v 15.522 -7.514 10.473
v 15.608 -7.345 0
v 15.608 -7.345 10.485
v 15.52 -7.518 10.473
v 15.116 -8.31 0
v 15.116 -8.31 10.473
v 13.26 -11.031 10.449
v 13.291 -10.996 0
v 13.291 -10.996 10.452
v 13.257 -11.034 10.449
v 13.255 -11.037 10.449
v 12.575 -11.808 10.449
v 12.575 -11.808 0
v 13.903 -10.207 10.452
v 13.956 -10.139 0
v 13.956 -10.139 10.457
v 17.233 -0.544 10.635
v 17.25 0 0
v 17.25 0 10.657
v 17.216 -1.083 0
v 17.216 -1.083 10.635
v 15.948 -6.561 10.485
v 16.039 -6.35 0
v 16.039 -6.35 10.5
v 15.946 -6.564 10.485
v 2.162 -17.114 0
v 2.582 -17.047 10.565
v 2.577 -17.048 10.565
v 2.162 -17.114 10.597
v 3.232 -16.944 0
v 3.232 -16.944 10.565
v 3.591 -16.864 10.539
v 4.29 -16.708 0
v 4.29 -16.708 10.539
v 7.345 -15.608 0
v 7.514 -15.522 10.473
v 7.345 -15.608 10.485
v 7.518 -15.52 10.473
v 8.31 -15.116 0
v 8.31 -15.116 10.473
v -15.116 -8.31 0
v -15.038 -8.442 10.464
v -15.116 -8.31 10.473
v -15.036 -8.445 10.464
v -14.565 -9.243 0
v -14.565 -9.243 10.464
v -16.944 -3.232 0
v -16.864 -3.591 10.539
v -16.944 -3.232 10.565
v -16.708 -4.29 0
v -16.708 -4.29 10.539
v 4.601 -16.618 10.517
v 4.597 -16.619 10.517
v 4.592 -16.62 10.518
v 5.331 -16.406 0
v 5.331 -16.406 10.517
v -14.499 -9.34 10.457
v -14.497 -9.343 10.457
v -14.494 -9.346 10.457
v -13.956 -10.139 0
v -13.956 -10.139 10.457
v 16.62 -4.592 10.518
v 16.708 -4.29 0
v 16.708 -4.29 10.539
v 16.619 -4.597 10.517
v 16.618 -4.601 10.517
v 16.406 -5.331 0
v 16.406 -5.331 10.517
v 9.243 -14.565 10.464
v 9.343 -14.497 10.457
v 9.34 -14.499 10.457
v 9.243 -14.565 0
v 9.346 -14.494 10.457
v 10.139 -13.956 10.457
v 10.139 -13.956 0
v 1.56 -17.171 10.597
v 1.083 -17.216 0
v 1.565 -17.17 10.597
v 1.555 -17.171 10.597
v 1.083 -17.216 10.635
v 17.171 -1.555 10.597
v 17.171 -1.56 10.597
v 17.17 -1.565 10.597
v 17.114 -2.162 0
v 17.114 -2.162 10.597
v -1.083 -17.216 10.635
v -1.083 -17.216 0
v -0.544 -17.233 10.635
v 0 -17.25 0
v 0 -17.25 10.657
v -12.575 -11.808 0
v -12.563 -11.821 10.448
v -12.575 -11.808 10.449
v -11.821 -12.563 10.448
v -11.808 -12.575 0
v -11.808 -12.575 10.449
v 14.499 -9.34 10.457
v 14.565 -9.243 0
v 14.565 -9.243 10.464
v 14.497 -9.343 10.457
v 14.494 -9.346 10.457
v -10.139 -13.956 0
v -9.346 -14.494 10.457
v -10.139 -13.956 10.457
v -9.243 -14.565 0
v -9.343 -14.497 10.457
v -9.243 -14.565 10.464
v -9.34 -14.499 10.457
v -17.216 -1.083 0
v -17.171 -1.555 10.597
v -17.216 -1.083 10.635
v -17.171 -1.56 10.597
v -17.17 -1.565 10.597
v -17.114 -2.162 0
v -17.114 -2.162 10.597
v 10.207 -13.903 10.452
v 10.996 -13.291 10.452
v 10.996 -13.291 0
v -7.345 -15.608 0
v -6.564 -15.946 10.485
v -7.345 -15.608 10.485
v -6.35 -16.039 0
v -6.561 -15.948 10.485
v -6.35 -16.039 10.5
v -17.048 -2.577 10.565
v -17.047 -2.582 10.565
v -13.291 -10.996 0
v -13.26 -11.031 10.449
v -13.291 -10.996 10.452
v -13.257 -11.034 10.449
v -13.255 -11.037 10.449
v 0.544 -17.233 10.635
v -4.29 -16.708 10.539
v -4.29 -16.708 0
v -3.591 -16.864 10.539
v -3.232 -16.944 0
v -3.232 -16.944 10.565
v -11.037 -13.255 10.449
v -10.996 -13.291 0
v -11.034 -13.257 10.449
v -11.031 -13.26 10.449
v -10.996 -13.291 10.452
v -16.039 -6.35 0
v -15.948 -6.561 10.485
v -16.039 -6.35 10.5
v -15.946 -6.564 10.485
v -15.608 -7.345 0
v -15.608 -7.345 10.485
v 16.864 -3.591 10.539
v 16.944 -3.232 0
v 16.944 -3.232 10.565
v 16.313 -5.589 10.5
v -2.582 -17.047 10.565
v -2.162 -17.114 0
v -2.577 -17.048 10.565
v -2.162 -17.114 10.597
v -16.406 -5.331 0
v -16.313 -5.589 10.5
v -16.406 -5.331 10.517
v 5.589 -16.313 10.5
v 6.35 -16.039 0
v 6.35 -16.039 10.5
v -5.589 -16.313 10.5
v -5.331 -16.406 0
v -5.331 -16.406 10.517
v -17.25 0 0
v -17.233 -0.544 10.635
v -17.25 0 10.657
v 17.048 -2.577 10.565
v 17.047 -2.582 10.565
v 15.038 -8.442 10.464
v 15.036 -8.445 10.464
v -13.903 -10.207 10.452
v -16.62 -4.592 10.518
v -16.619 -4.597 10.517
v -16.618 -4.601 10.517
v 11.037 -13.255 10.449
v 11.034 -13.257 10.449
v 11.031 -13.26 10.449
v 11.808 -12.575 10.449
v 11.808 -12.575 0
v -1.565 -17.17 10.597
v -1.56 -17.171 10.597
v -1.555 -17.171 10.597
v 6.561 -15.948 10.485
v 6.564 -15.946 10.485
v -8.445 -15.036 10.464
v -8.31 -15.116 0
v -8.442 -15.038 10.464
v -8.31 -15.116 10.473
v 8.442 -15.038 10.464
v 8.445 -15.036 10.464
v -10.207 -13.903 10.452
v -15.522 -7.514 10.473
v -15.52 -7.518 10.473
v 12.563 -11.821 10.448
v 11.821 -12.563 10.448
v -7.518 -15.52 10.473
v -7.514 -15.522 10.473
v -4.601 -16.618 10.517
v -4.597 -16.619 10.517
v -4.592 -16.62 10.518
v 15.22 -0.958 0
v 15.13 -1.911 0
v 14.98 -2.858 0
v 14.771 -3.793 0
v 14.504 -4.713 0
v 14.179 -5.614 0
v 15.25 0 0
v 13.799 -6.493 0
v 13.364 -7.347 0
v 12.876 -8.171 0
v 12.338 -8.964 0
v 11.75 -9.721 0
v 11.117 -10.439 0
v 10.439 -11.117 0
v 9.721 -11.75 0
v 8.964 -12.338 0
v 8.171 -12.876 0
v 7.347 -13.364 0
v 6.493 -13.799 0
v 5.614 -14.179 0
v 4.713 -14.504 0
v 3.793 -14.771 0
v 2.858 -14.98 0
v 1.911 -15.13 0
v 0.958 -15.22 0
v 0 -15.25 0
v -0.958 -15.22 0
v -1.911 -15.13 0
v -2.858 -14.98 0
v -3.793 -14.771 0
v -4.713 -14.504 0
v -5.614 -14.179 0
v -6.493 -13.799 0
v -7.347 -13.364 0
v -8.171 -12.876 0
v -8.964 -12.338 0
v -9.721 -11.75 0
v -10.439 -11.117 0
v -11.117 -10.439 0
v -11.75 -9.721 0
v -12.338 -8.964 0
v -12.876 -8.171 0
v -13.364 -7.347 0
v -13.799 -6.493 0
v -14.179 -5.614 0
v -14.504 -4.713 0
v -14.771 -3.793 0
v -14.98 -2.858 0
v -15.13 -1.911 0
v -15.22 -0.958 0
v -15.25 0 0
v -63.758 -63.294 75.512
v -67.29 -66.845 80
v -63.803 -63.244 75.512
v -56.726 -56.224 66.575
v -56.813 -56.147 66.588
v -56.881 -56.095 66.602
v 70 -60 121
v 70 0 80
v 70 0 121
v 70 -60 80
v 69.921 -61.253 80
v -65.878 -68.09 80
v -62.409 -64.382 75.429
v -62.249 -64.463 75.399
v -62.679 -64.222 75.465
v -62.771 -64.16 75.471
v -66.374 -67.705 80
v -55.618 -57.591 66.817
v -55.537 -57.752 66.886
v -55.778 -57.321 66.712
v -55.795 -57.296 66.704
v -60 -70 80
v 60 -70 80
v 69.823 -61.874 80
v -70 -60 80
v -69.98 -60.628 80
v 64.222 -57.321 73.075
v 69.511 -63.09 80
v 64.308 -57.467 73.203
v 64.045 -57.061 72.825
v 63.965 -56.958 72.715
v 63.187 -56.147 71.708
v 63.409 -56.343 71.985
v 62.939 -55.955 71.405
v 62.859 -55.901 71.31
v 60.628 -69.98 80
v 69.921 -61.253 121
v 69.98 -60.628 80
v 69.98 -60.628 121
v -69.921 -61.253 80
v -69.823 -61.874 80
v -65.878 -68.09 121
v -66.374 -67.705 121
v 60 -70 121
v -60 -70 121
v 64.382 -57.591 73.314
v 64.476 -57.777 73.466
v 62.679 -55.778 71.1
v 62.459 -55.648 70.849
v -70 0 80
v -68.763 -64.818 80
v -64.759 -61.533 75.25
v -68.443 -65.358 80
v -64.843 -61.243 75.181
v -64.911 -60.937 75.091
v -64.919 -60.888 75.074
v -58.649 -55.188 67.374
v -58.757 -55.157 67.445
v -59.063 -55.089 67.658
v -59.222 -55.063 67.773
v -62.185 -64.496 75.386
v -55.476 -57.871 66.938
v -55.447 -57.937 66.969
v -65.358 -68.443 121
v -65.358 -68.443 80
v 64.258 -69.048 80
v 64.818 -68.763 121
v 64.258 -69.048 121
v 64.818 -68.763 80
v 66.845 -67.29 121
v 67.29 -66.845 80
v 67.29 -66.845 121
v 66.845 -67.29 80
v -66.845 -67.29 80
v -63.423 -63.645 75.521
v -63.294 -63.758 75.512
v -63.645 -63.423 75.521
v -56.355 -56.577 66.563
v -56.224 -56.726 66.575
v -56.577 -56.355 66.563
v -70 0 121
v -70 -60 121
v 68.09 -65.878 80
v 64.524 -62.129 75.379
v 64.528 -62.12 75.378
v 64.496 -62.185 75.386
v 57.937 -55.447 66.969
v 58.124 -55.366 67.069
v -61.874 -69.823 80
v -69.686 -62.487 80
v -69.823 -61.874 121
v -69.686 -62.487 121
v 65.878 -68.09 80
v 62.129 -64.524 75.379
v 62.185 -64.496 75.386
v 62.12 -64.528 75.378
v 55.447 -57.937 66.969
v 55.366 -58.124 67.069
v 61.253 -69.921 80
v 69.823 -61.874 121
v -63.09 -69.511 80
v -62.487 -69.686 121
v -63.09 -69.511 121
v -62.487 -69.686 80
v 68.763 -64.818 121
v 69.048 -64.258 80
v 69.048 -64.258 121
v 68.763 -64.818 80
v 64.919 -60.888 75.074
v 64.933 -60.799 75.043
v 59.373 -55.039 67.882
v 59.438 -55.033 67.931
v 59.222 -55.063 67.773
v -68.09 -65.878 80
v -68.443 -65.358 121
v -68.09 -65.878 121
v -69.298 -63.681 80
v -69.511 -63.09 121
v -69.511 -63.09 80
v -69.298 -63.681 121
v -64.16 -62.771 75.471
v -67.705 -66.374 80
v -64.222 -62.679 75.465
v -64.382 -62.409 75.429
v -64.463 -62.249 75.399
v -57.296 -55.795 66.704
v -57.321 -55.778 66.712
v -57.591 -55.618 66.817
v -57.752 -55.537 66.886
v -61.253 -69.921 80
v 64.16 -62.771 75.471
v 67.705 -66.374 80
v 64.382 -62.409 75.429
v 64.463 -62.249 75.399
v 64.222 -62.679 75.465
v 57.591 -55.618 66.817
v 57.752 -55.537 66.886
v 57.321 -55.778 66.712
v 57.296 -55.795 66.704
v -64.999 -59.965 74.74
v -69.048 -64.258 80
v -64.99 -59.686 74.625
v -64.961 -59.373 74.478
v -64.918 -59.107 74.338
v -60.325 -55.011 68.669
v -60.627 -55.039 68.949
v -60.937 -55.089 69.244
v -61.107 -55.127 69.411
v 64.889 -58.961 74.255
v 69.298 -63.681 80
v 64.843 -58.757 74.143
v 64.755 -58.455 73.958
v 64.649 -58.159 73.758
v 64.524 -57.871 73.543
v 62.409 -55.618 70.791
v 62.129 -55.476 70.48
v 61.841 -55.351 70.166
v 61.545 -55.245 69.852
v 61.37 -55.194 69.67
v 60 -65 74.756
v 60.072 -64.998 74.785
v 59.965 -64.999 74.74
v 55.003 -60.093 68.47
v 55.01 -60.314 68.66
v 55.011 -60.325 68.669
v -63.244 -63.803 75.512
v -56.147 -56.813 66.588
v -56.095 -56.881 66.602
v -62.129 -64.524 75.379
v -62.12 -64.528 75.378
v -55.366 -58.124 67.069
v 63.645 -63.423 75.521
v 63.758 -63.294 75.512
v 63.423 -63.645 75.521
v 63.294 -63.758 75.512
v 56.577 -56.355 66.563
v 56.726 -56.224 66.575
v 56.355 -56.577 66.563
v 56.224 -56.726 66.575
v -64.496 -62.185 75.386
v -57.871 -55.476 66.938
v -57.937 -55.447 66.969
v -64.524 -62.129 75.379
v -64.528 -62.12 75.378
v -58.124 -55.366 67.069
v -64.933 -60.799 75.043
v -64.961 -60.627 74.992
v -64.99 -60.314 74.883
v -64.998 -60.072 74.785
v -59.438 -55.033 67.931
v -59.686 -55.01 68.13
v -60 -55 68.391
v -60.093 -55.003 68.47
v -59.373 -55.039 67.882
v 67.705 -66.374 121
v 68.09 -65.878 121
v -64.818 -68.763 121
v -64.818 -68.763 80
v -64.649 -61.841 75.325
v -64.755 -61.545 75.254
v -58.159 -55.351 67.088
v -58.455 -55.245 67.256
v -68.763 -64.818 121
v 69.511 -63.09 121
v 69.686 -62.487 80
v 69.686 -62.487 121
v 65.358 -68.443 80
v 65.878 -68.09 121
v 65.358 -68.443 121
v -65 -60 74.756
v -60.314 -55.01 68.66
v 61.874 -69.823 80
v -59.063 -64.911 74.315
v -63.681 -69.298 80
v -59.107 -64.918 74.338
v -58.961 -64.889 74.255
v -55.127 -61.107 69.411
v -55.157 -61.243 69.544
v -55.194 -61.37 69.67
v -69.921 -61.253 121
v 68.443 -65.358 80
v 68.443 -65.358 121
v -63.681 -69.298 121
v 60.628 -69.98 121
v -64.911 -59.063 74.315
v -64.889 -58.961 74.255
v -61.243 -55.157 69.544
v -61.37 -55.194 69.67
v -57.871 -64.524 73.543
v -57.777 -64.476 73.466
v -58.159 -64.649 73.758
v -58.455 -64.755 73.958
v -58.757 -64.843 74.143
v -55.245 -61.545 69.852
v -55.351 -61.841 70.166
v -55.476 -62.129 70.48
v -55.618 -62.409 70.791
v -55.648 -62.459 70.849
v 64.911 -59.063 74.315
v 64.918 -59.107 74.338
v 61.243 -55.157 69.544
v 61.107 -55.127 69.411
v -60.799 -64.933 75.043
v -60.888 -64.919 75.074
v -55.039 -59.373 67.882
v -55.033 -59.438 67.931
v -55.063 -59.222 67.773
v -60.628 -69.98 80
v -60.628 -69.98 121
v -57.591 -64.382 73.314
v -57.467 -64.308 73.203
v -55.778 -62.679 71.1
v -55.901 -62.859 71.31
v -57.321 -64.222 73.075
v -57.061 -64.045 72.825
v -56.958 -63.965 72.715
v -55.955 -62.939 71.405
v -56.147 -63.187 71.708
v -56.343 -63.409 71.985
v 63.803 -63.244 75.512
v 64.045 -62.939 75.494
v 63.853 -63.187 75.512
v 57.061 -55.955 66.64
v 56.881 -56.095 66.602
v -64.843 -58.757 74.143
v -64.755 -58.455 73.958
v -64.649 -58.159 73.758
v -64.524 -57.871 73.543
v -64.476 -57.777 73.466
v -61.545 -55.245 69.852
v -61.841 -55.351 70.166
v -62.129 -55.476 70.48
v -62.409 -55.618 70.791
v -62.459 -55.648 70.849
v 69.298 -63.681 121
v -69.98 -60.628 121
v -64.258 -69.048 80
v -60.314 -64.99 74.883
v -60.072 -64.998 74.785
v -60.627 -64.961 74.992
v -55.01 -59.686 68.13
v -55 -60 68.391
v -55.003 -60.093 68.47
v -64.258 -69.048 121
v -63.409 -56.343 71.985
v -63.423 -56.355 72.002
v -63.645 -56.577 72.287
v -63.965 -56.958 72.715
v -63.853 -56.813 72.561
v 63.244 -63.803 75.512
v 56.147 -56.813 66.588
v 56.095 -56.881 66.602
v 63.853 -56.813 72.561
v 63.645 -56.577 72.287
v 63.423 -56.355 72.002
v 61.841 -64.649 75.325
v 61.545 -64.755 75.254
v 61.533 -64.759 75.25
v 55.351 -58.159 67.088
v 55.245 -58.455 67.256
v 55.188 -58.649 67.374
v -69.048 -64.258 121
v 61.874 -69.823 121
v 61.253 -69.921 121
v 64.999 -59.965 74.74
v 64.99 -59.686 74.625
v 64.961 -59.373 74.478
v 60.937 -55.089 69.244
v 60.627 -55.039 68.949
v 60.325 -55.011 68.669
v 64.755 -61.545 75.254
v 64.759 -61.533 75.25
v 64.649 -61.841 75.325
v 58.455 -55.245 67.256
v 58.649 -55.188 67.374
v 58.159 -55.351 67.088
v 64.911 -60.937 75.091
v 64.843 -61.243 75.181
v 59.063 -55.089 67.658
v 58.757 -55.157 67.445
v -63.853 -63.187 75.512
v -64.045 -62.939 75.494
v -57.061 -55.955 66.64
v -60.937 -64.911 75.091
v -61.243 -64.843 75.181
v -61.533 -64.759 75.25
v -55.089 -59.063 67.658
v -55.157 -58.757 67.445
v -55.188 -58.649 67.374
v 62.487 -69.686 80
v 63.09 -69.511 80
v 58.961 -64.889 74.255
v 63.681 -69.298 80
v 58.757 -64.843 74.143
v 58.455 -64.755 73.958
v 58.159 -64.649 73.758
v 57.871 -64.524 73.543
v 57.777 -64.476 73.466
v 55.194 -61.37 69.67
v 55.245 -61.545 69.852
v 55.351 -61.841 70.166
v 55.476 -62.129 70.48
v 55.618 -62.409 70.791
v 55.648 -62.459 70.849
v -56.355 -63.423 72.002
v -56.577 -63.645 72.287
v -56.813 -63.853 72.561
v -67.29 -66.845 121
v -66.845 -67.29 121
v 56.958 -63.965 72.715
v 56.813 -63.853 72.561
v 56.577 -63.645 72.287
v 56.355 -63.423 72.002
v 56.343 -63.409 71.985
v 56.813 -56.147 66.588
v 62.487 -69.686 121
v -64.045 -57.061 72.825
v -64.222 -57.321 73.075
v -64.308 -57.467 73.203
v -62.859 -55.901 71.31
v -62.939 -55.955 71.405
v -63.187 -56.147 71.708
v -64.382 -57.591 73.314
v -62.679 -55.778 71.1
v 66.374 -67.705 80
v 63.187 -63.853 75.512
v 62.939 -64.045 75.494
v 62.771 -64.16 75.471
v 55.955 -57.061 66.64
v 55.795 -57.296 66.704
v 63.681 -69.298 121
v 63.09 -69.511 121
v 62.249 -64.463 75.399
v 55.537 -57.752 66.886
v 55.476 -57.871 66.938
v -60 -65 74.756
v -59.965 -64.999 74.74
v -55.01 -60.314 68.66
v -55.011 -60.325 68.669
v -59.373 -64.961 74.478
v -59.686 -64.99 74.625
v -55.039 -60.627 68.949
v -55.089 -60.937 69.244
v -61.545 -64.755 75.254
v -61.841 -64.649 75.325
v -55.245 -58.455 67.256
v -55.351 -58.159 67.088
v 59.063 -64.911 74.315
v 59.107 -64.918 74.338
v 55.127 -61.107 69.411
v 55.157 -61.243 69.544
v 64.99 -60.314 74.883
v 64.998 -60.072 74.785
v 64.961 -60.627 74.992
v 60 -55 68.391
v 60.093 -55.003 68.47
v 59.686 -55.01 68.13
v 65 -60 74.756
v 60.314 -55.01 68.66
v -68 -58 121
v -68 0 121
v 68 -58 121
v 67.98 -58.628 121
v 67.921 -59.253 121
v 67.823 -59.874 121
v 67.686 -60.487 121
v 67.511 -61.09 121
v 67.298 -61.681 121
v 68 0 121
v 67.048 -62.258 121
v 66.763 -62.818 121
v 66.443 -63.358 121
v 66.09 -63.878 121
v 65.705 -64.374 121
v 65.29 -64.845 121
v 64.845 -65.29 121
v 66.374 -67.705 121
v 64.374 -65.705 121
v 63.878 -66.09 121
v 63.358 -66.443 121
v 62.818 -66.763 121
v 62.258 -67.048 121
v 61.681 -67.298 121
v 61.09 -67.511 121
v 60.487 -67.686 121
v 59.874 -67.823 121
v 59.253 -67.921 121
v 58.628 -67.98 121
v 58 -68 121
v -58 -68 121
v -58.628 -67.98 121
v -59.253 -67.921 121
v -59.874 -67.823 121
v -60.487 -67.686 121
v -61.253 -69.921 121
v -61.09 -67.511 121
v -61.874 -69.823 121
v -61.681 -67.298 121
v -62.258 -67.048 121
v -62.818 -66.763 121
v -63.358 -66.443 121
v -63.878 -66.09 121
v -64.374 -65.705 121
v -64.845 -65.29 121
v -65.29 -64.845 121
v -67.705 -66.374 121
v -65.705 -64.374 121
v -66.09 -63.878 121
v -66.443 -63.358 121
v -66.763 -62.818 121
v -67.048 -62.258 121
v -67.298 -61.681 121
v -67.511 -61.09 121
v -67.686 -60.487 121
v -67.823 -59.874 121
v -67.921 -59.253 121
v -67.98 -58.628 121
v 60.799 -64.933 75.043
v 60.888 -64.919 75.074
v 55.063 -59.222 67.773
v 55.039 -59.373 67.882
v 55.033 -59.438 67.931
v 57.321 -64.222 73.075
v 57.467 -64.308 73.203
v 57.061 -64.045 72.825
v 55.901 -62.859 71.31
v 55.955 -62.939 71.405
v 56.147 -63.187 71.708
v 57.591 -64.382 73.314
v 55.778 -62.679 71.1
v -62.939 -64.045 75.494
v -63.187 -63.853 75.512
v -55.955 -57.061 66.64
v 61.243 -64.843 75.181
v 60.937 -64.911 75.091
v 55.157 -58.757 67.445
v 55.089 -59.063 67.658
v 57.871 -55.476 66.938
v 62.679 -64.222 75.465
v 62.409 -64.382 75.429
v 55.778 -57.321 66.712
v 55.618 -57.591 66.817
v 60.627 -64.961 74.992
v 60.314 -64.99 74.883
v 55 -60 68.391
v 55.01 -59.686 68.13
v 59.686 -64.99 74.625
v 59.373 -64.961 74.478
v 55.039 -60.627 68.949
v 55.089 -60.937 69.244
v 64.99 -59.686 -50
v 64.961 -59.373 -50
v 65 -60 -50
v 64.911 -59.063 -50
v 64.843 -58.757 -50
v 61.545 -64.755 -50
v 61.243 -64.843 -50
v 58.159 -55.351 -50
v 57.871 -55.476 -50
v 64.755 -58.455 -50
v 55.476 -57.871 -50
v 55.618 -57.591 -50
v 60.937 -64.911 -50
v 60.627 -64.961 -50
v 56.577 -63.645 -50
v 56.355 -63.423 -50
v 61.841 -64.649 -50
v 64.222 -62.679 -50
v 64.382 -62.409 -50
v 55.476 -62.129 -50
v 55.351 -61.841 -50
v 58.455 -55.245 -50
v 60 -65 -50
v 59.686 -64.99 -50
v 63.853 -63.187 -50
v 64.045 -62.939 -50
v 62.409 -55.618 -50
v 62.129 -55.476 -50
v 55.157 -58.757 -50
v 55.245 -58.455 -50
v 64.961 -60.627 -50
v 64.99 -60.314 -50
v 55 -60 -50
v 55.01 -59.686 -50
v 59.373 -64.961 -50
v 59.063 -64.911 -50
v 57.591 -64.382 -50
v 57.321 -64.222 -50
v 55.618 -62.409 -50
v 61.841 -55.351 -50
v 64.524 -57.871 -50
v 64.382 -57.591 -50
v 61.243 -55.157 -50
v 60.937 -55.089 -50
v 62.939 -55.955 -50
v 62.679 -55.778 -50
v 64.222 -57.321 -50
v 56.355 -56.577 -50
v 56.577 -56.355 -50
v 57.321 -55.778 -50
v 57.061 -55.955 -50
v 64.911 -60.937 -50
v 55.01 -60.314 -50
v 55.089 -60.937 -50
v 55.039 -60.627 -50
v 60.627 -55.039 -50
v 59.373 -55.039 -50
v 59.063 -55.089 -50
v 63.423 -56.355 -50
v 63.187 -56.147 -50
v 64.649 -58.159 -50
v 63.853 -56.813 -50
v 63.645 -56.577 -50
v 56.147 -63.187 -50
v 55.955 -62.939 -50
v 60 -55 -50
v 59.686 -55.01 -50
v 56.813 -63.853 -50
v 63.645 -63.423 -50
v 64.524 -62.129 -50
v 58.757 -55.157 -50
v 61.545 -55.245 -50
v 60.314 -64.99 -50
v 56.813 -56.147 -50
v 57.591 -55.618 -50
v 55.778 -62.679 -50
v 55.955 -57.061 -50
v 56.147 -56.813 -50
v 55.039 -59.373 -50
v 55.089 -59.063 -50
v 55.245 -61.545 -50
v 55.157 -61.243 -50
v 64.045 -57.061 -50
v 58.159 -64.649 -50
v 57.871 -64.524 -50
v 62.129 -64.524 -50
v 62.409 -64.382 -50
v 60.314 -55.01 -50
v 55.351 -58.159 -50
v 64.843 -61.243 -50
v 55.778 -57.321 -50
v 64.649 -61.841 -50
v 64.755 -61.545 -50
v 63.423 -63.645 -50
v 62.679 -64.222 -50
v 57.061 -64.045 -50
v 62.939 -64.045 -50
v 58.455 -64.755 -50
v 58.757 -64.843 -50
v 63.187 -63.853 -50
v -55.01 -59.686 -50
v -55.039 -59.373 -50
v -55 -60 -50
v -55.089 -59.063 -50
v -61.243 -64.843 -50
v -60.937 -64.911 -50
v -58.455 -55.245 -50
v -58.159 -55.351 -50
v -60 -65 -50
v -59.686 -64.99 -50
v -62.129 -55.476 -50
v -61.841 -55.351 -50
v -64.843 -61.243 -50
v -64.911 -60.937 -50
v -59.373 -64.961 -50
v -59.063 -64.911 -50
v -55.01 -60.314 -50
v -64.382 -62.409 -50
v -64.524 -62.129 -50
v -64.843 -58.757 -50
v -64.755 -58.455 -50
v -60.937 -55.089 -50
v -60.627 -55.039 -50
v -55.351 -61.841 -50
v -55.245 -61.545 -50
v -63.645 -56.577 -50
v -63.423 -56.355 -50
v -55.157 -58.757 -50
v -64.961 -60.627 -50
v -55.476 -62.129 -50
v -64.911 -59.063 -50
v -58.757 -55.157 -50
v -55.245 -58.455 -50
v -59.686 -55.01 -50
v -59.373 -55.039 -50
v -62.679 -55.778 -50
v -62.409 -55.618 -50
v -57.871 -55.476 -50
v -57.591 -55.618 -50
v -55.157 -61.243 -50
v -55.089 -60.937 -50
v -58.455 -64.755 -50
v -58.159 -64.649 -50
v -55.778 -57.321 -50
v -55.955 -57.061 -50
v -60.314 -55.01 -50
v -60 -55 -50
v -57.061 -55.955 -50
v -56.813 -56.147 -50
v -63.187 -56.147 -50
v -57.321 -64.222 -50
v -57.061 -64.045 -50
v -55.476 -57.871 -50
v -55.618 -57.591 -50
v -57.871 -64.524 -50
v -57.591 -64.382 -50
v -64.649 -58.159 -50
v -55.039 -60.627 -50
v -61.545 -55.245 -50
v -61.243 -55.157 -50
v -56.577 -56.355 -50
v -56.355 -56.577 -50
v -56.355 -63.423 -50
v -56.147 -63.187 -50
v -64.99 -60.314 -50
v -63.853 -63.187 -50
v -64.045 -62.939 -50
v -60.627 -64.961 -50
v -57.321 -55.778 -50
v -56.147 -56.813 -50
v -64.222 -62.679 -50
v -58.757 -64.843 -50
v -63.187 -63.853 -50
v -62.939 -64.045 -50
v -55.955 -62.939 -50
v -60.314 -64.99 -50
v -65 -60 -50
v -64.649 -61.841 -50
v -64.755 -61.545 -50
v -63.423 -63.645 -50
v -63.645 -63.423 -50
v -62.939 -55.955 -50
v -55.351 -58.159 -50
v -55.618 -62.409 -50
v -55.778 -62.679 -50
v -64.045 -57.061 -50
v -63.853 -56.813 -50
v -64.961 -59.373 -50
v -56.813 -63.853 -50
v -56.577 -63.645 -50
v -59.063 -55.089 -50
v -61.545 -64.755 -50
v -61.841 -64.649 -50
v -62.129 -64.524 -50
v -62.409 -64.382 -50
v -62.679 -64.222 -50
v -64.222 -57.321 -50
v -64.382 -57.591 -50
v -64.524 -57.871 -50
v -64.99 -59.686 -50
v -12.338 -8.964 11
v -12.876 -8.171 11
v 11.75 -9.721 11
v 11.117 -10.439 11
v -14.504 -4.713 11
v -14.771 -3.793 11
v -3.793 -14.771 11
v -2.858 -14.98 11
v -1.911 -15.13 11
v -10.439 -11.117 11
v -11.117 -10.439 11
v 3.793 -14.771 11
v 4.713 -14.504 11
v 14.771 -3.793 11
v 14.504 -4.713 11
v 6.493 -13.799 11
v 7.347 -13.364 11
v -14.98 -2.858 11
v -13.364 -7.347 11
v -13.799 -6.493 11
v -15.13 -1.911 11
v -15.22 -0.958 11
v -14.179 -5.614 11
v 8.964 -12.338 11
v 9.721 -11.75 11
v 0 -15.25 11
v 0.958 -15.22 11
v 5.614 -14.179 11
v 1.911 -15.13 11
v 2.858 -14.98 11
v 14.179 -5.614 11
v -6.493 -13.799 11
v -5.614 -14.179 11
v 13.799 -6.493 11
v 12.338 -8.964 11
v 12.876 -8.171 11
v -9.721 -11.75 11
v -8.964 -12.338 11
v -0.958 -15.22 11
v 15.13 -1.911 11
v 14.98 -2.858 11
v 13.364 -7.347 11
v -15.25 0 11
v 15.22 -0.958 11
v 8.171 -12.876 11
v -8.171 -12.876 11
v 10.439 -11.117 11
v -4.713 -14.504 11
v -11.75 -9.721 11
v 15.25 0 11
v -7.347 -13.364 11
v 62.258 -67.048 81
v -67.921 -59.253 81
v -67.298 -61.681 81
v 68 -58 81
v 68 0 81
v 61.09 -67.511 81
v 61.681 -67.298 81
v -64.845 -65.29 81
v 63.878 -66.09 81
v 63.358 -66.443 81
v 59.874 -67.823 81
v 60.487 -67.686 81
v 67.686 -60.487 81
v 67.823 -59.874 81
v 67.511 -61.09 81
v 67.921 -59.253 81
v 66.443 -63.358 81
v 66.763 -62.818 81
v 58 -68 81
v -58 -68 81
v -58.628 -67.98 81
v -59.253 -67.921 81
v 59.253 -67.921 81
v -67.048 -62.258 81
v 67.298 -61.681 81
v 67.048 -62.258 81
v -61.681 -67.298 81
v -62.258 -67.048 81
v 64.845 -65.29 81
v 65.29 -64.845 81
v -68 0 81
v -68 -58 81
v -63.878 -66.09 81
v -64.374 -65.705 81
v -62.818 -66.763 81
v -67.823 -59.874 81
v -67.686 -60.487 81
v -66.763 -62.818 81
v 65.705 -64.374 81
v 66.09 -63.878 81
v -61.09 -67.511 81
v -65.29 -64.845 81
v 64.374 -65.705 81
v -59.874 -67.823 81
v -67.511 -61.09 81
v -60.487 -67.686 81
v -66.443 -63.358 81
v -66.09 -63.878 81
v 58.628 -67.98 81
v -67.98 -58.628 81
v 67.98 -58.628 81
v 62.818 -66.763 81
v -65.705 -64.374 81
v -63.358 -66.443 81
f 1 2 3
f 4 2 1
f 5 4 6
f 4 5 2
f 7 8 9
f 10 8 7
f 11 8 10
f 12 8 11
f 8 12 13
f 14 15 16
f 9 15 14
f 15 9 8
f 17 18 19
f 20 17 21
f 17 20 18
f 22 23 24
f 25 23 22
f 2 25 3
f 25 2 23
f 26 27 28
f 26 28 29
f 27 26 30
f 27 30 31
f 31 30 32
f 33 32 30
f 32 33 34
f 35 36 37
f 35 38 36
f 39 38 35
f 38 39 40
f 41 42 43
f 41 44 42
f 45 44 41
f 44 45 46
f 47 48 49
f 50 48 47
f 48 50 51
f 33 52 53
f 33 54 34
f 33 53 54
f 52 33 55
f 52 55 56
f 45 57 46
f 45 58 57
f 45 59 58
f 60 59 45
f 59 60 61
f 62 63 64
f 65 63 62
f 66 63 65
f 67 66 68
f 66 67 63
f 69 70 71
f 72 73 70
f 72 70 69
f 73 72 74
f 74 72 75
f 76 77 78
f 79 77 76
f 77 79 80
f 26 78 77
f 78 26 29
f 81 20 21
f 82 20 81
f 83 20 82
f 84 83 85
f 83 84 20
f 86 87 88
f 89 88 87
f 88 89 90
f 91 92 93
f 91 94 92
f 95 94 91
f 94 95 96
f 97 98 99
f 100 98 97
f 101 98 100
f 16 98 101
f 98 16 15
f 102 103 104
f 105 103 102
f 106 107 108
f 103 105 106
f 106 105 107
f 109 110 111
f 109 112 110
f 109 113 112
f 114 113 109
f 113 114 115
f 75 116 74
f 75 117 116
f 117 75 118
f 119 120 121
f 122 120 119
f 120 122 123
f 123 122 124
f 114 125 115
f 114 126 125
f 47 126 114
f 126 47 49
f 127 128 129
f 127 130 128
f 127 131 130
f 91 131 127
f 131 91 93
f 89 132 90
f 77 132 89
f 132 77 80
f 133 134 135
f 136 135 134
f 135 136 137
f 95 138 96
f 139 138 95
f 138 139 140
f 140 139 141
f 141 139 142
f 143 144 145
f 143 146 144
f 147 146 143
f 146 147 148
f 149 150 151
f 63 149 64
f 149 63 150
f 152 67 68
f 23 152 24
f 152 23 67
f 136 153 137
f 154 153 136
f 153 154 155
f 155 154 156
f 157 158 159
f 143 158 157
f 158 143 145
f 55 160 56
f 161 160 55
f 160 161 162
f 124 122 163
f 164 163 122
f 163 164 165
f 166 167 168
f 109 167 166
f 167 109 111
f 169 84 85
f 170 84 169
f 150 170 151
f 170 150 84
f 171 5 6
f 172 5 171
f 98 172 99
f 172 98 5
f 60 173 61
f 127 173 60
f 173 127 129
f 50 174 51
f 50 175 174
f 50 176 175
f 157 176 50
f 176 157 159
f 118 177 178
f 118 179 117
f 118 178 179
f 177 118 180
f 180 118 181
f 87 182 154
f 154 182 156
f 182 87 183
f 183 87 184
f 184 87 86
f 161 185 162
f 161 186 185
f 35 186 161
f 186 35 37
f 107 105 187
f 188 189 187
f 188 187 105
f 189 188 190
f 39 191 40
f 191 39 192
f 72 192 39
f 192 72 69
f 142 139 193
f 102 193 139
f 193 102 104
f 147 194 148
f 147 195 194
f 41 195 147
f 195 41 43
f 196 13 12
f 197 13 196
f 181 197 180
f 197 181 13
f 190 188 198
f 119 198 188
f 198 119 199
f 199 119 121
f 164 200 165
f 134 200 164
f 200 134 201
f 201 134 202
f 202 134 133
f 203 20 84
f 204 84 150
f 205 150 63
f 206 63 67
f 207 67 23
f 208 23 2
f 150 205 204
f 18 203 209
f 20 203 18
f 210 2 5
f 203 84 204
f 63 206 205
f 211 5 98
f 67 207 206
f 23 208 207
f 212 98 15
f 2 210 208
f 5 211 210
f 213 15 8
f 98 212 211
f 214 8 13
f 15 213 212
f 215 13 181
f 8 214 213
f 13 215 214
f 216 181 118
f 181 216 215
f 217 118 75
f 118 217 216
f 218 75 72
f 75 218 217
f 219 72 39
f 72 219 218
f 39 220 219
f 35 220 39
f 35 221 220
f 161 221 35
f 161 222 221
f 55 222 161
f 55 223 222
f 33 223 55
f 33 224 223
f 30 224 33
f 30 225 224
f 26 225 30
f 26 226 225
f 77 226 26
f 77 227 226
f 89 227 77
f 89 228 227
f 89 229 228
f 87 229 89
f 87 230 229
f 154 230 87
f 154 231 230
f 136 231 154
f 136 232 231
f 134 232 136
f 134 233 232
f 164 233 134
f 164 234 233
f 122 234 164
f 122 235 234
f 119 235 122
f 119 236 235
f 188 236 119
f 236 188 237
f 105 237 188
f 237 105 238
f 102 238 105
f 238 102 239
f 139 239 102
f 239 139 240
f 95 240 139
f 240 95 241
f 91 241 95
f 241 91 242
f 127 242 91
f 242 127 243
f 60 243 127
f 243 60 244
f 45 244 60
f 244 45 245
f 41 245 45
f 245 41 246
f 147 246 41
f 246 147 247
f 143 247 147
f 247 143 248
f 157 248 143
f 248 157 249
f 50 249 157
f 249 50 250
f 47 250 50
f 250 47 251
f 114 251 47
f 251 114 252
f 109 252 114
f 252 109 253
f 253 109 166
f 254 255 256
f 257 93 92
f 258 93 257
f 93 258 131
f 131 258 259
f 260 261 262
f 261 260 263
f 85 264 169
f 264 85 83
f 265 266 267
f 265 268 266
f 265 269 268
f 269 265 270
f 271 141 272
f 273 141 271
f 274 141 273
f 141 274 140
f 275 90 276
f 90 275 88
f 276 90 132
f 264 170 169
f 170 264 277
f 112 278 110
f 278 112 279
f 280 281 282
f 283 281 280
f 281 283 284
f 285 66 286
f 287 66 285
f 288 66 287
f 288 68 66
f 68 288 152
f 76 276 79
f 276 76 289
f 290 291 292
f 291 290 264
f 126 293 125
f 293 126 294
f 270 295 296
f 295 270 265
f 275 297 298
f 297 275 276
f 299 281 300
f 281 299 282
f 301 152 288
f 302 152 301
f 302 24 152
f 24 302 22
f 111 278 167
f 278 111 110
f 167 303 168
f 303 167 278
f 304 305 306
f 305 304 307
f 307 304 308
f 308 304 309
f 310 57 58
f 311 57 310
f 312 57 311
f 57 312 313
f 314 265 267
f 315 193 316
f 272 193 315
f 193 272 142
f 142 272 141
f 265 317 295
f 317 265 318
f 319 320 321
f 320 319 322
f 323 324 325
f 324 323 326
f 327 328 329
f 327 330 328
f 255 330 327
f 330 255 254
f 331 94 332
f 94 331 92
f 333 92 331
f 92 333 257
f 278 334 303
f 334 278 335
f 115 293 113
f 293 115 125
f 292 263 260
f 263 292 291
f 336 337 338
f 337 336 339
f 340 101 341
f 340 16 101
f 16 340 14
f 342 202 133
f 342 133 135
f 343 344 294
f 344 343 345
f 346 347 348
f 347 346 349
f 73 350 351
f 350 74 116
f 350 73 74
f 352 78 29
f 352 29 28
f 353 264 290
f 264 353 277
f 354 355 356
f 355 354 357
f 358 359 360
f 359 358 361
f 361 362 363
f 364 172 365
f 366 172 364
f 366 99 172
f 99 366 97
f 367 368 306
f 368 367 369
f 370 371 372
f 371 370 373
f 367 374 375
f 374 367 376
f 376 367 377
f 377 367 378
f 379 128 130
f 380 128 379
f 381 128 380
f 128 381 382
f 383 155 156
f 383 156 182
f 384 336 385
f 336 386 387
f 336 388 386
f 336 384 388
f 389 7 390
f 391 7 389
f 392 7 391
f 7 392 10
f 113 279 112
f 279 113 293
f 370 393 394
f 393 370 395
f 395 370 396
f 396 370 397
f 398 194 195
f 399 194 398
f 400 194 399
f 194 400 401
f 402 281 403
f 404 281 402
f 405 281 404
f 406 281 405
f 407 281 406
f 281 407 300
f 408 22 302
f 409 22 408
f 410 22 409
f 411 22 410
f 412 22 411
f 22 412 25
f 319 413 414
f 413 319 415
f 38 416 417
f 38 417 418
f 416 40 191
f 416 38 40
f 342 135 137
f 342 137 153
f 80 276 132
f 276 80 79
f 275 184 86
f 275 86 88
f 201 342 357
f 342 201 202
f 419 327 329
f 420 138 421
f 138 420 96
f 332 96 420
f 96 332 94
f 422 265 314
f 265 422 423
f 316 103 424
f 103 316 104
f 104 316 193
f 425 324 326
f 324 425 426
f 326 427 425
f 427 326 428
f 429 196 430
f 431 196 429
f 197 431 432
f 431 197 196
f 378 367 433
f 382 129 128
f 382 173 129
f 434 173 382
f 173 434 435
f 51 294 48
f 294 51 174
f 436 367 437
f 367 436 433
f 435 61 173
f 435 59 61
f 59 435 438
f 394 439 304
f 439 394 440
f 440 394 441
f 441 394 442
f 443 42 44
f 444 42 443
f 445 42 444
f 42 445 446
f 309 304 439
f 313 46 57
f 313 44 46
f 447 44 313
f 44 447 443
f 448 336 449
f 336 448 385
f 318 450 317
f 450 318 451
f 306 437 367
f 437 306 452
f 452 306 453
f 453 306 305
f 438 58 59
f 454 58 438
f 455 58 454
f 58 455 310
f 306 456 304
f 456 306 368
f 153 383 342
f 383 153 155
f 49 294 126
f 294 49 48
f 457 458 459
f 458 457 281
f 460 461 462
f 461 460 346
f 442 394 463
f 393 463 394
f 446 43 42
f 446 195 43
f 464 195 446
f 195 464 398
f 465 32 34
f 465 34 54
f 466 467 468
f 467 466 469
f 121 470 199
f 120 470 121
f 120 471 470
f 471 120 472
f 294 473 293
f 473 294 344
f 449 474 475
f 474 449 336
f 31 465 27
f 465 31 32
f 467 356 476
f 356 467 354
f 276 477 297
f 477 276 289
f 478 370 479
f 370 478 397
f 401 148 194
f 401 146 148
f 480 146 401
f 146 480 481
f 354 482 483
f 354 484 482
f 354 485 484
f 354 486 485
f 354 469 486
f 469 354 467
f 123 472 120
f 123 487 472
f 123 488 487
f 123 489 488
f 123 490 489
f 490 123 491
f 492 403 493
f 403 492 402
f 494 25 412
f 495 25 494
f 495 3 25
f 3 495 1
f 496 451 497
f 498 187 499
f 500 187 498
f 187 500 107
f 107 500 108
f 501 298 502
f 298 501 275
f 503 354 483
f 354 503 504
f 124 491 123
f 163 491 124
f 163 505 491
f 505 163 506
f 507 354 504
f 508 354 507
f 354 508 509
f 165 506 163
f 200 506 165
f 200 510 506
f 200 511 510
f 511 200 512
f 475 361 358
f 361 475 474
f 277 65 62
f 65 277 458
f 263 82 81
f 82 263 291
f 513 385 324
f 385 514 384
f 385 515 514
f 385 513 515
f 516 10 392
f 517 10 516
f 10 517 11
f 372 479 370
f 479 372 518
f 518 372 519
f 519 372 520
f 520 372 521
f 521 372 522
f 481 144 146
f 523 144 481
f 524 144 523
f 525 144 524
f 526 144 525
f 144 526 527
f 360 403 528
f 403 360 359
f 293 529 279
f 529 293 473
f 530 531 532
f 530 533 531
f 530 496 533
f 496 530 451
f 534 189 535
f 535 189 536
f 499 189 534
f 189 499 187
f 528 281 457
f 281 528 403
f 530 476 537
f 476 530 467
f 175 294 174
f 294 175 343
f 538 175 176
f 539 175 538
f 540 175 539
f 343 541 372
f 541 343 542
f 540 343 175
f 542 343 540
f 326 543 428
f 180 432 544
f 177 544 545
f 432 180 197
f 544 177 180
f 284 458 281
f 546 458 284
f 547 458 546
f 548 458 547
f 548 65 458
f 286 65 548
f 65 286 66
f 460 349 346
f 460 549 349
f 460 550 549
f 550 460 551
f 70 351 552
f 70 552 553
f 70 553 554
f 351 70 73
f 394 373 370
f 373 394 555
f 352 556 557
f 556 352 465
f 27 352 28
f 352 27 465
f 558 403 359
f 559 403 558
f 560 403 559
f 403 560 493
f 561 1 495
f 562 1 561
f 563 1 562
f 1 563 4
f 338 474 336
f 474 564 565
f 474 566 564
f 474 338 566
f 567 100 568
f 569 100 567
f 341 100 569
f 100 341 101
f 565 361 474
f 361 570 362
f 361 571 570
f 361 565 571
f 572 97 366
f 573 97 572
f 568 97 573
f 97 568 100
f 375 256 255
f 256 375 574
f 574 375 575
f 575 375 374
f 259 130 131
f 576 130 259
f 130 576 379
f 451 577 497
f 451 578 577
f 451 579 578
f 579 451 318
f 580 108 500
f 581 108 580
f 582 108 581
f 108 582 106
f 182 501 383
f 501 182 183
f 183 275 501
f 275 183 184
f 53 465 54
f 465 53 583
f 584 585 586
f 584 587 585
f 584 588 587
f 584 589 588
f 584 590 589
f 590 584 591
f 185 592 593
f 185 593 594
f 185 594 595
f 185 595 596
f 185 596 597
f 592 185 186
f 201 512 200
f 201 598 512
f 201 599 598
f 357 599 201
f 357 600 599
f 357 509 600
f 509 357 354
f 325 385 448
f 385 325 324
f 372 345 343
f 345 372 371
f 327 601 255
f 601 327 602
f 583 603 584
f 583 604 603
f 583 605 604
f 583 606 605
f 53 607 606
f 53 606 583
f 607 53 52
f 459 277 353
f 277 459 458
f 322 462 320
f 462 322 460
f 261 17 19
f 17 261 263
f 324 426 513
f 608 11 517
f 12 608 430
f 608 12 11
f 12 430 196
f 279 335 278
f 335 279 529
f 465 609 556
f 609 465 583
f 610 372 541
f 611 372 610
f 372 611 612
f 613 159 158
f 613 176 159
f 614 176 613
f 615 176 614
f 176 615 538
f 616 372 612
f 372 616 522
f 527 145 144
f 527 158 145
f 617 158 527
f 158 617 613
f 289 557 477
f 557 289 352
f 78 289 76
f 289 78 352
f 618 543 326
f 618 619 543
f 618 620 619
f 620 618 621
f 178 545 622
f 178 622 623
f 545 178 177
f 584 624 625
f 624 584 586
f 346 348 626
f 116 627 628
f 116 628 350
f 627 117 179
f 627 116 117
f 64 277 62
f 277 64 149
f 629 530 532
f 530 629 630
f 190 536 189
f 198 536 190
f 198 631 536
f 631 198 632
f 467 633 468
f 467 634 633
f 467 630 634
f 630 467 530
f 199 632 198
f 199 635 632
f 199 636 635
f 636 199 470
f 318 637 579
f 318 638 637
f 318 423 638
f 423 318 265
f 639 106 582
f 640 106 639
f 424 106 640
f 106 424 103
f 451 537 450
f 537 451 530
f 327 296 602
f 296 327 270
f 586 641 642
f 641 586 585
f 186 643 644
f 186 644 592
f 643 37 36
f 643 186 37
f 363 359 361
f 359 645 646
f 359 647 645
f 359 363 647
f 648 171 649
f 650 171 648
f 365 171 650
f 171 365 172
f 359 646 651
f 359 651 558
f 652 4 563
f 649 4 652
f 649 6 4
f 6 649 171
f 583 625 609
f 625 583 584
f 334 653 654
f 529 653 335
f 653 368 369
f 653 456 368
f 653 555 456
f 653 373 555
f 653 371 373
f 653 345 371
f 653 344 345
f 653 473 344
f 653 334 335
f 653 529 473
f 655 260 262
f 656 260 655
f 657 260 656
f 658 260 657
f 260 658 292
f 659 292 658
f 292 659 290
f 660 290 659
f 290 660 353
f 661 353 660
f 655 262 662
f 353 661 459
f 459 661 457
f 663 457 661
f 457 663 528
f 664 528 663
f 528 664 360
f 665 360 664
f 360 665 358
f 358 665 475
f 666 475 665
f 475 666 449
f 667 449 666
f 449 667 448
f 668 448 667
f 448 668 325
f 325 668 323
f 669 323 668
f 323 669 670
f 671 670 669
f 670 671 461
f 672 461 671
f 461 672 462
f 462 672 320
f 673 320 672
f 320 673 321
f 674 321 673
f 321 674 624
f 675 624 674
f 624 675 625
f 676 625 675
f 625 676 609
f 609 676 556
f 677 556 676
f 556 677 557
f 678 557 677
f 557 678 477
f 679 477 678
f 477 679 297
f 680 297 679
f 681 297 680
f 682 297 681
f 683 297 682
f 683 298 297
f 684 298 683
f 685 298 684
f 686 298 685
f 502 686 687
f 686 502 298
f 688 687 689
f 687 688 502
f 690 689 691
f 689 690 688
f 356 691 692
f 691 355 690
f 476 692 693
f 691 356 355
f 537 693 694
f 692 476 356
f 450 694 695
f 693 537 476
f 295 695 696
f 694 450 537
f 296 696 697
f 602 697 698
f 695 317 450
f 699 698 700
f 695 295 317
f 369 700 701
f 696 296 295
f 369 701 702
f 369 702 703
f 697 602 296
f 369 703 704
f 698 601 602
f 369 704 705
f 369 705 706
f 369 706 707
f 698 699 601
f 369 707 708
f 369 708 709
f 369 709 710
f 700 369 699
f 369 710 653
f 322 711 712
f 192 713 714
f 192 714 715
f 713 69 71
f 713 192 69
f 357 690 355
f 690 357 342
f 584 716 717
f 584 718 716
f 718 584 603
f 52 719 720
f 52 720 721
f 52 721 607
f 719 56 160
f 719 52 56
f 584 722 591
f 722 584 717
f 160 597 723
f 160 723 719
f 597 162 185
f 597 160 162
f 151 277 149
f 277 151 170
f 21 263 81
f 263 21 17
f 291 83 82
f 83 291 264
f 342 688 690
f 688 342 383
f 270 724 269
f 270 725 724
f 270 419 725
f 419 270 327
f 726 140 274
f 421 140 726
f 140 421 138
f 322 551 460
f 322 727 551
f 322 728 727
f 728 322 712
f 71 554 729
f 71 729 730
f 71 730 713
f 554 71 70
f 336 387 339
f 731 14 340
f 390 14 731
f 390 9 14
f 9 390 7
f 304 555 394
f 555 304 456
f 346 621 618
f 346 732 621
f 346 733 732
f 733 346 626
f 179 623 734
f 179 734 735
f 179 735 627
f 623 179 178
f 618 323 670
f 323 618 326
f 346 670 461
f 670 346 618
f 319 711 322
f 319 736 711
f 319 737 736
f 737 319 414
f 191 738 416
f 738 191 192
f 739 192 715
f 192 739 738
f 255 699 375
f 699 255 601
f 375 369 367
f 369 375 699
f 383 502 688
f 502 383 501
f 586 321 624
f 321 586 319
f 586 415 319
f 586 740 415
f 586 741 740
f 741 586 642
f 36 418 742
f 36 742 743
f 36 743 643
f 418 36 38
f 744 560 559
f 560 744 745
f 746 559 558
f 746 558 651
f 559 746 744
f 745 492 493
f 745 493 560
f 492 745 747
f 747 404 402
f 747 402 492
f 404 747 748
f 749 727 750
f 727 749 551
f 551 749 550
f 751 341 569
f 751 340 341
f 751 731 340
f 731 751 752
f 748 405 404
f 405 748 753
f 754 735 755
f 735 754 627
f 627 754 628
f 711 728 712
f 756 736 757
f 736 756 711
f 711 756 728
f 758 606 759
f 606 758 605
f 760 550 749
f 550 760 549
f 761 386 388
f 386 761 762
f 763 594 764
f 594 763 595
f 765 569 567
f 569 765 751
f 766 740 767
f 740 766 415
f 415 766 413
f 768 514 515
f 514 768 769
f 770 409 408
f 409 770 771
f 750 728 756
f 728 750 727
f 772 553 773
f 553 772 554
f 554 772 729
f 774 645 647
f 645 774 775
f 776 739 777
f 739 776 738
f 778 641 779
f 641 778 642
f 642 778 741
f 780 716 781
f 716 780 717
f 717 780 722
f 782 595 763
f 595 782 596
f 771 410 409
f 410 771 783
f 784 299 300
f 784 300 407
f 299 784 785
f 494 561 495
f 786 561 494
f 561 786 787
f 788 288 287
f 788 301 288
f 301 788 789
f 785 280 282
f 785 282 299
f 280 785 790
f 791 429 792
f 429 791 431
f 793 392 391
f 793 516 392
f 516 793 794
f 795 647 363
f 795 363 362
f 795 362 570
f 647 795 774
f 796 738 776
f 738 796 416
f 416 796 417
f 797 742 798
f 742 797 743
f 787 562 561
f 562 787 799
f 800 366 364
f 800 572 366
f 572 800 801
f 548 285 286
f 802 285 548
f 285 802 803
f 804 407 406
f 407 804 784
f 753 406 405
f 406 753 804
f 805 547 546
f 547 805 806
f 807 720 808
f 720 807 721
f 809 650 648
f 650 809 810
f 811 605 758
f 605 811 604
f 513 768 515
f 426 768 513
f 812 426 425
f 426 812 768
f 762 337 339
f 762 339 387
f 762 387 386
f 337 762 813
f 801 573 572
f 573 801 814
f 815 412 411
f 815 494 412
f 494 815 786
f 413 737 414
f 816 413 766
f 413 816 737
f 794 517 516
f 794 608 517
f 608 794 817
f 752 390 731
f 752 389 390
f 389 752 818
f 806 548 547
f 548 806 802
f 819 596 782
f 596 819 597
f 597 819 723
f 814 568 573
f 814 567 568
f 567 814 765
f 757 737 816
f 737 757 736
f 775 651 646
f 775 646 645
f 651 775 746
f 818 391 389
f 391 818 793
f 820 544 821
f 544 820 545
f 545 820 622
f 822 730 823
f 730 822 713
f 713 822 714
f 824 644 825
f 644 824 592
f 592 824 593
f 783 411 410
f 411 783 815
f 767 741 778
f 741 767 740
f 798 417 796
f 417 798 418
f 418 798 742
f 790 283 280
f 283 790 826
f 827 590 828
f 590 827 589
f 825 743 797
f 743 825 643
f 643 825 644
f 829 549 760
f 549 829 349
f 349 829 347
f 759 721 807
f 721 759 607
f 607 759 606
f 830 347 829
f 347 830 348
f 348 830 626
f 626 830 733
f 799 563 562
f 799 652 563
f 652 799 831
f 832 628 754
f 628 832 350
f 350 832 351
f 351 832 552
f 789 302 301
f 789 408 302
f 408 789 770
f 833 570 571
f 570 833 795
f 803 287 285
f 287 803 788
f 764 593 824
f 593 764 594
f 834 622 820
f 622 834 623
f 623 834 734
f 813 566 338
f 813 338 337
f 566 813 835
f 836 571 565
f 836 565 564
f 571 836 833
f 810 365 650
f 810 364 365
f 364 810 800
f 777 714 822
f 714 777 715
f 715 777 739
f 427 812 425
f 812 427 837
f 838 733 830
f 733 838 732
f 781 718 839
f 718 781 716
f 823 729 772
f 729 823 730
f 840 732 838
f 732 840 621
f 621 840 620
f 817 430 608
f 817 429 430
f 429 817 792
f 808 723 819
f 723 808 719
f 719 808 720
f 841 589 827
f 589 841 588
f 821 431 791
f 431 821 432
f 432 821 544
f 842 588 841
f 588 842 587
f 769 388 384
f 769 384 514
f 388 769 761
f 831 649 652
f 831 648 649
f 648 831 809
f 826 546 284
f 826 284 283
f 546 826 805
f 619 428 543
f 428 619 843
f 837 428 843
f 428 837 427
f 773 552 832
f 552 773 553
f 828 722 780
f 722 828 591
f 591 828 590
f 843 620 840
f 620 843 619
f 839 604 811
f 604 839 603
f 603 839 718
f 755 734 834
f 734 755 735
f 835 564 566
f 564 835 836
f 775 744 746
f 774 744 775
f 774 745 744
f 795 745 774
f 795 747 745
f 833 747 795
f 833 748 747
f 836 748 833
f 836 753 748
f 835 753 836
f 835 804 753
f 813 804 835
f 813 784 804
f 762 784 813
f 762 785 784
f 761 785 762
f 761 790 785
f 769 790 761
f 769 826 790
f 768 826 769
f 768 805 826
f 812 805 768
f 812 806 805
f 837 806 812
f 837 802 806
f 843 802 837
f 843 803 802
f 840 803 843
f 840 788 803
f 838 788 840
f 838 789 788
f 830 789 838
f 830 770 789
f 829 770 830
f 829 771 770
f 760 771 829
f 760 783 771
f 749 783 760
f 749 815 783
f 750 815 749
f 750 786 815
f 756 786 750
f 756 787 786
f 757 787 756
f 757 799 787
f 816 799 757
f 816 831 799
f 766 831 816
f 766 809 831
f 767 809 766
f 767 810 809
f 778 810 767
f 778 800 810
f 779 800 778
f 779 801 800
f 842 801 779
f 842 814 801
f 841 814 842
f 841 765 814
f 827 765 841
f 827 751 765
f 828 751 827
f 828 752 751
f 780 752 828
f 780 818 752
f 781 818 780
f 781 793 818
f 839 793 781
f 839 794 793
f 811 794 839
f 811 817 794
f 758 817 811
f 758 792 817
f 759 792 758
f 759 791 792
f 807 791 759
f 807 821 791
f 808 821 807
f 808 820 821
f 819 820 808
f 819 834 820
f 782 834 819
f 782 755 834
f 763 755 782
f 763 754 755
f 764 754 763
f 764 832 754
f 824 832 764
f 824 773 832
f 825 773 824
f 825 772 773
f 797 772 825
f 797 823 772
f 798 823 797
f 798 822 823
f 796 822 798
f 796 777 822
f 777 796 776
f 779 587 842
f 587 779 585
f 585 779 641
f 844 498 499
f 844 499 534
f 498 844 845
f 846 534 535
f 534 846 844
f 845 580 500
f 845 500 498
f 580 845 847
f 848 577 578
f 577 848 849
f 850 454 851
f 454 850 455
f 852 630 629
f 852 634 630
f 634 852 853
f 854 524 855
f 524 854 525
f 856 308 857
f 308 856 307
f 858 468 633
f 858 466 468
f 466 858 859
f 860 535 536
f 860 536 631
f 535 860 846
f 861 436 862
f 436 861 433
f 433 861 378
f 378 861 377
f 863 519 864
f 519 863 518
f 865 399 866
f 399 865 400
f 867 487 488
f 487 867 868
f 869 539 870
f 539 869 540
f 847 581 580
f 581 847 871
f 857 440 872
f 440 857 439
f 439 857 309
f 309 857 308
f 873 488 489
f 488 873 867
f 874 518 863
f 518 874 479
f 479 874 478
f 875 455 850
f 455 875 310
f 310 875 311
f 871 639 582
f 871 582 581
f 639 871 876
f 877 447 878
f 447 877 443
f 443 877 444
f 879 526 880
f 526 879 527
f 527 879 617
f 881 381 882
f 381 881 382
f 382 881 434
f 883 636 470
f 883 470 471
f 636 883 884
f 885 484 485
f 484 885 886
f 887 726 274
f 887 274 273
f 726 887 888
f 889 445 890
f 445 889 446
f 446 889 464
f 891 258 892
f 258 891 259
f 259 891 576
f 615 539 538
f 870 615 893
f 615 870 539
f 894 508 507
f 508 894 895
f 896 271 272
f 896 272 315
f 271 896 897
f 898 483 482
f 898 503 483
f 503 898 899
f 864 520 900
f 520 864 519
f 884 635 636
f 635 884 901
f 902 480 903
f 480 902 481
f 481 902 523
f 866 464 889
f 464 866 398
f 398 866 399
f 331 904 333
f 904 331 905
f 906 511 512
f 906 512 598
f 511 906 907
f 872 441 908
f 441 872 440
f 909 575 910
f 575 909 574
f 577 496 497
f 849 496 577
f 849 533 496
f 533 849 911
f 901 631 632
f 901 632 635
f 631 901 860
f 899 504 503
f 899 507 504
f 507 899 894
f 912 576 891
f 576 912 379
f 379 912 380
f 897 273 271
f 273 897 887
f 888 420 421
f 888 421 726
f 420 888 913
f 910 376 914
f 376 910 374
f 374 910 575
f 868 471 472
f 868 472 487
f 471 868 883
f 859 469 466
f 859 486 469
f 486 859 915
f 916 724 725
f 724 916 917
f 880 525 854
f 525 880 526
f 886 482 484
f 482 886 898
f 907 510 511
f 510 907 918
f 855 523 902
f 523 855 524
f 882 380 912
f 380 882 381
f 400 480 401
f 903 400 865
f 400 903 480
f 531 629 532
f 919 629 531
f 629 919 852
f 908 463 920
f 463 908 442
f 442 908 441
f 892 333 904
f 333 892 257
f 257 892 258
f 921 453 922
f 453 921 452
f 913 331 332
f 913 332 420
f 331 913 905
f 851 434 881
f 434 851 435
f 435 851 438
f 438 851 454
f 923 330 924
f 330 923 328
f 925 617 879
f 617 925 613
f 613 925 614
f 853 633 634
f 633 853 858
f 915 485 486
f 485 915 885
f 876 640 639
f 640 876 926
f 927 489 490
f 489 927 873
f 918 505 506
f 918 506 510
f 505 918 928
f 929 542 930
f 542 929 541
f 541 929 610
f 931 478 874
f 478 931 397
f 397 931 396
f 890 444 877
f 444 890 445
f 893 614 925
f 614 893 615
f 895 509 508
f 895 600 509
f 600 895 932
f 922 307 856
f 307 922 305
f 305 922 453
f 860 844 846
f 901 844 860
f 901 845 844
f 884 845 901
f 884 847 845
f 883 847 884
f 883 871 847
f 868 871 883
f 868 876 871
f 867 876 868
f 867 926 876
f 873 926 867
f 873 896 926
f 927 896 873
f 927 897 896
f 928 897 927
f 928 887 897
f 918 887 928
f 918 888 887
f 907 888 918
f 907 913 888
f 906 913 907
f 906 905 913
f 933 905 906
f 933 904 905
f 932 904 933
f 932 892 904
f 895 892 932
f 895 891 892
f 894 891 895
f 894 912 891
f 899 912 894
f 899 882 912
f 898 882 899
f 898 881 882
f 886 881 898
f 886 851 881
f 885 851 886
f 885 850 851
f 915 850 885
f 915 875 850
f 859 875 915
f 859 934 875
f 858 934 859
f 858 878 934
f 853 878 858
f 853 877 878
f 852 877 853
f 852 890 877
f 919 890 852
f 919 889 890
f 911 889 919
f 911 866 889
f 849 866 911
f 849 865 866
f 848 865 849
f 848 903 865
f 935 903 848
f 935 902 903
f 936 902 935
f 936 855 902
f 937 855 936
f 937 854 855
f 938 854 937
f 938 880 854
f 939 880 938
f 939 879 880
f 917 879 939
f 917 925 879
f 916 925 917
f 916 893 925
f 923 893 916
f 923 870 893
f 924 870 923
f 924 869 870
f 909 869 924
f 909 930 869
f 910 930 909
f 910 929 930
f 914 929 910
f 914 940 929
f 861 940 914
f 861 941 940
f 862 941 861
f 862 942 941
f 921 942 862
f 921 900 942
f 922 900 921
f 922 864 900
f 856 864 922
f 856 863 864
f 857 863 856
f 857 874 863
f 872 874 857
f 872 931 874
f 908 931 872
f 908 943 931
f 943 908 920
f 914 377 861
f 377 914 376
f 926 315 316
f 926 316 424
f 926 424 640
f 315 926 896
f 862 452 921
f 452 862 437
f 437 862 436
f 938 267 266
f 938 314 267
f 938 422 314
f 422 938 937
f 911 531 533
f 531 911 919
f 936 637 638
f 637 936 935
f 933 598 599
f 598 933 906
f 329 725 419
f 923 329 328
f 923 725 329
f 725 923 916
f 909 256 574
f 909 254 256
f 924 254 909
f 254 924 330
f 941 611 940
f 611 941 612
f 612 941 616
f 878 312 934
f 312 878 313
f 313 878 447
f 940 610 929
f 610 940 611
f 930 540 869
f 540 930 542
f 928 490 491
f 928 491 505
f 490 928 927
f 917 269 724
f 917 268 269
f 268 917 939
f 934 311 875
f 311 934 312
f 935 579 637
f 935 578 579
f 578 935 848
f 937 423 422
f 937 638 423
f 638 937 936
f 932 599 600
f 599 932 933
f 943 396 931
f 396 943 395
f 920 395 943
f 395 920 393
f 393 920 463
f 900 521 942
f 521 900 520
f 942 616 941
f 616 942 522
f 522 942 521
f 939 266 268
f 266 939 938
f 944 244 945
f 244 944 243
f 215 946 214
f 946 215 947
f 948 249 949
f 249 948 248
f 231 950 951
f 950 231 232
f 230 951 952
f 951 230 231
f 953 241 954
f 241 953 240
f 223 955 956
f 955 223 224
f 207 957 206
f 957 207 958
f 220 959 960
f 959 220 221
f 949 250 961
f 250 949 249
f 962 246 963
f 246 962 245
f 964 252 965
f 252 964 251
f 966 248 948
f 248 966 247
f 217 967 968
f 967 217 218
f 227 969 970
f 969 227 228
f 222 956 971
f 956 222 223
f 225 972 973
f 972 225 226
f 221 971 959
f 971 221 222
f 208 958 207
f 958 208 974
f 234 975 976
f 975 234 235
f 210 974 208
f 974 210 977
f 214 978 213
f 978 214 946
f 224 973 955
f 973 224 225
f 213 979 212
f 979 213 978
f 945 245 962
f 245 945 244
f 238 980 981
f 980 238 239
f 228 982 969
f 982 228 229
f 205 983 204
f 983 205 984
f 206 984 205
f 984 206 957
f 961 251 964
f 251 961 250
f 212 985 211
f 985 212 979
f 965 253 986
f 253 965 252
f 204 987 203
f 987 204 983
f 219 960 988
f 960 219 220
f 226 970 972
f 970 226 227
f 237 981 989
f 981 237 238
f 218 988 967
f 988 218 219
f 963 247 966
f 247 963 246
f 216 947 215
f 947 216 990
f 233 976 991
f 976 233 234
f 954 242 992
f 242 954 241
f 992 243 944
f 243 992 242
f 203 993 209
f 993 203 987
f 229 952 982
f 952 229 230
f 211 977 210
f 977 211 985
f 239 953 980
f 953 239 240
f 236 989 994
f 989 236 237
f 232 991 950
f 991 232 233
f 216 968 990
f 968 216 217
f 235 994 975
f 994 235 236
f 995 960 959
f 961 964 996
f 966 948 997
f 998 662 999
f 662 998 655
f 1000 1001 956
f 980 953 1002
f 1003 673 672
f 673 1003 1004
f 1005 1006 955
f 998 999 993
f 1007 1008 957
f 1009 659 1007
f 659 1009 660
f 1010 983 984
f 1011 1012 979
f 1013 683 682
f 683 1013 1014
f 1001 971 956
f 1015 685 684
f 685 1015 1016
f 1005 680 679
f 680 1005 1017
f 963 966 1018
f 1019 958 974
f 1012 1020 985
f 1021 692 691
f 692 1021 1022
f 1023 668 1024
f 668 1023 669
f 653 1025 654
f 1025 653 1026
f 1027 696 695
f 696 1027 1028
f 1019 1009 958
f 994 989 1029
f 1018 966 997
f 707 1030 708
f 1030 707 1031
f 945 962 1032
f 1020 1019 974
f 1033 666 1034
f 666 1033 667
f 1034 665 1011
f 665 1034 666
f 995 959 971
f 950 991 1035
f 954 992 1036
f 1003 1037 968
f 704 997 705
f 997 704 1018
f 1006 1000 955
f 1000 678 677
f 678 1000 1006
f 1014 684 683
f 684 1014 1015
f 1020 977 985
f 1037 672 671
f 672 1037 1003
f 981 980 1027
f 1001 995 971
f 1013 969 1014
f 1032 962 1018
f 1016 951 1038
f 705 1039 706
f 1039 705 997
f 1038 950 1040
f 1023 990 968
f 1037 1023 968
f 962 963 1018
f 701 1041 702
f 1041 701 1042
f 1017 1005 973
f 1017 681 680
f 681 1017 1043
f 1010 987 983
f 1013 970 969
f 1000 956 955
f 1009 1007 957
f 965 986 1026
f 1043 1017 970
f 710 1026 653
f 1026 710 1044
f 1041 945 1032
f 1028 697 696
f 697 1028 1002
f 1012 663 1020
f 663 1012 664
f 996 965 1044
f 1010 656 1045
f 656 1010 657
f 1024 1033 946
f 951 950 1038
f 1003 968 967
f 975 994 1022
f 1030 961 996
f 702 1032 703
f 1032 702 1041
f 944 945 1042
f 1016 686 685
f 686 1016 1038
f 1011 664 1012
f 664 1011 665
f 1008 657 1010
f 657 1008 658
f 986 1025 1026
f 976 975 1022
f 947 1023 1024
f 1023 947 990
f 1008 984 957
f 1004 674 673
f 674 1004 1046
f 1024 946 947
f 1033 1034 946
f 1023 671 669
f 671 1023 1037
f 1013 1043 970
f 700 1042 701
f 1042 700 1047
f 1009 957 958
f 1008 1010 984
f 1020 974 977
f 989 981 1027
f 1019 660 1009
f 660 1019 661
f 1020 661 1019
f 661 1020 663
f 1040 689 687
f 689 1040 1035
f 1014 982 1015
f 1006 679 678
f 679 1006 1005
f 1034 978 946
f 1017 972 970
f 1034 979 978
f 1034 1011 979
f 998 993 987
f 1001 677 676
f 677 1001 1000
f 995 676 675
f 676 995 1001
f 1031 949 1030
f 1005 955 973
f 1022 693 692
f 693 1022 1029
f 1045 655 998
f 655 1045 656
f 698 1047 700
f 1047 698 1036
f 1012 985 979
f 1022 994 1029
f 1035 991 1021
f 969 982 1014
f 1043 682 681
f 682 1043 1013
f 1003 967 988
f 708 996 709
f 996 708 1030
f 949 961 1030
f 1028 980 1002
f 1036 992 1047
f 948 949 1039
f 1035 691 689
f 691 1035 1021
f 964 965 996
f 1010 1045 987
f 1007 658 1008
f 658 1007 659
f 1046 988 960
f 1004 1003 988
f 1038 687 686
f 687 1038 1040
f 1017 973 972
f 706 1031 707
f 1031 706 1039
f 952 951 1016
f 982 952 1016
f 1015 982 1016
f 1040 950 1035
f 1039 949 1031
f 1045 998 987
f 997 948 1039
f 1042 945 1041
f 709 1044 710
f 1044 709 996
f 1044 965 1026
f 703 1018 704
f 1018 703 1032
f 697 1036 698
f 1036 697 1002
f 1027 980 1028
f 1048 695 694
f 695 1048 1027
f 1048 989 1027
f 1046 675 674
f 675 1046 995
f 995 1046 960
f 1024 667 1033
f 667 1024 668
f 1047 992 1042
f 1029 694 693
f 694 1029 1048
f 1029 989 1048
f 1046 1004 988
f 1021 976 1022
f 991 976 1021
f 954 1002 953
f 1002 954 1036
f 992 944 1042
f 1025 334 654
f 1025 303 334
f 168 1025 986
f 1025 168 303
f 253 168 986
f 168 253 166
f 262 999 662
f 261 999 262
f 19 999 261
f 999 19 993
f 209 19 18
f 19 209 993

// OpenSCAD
module bunker(){
    $fn=100;
    difference(){
        union(){
            translate([0,0,10]) cylinder(h=20,d=27.5+3+4,center=true);
            hull(){
                translate([0,0,20]) cylinder(h=20,d=27.5+3+3,center=true);
                minkowski(){
                    translate([0,0,100]) cube([120,120,40],center=true);
                    cylinder(d=20);
                };
            }
            translate([60,60,20]) cylinder(h=140,d=10,center=true);
            translate([60,-60,20]) cylinder(h=140,d=10,center=true);
            translate([-60,60,20]) cylinder(h=140,d=10,center=true);
            translate([-60,-60,20]) cylinder(h=140,d=10,center=true);
        }

        union(){
            translate([0,0,10]) cylinder(h=30,d=27.5+3,center=true);
            hull(){
                translate([0,0,21]) cylinder(h=20,d=27.5+3,center=true);
                minkowski(){
                    translate([0,0,100+1]) cube([120-4,120-4,40],center=true);
                    cylinder(d=20);
                };
            }
        
        }
        
        translate([0,150,0]) color("red") cube(300, center=true);
    }
}

bunker();
